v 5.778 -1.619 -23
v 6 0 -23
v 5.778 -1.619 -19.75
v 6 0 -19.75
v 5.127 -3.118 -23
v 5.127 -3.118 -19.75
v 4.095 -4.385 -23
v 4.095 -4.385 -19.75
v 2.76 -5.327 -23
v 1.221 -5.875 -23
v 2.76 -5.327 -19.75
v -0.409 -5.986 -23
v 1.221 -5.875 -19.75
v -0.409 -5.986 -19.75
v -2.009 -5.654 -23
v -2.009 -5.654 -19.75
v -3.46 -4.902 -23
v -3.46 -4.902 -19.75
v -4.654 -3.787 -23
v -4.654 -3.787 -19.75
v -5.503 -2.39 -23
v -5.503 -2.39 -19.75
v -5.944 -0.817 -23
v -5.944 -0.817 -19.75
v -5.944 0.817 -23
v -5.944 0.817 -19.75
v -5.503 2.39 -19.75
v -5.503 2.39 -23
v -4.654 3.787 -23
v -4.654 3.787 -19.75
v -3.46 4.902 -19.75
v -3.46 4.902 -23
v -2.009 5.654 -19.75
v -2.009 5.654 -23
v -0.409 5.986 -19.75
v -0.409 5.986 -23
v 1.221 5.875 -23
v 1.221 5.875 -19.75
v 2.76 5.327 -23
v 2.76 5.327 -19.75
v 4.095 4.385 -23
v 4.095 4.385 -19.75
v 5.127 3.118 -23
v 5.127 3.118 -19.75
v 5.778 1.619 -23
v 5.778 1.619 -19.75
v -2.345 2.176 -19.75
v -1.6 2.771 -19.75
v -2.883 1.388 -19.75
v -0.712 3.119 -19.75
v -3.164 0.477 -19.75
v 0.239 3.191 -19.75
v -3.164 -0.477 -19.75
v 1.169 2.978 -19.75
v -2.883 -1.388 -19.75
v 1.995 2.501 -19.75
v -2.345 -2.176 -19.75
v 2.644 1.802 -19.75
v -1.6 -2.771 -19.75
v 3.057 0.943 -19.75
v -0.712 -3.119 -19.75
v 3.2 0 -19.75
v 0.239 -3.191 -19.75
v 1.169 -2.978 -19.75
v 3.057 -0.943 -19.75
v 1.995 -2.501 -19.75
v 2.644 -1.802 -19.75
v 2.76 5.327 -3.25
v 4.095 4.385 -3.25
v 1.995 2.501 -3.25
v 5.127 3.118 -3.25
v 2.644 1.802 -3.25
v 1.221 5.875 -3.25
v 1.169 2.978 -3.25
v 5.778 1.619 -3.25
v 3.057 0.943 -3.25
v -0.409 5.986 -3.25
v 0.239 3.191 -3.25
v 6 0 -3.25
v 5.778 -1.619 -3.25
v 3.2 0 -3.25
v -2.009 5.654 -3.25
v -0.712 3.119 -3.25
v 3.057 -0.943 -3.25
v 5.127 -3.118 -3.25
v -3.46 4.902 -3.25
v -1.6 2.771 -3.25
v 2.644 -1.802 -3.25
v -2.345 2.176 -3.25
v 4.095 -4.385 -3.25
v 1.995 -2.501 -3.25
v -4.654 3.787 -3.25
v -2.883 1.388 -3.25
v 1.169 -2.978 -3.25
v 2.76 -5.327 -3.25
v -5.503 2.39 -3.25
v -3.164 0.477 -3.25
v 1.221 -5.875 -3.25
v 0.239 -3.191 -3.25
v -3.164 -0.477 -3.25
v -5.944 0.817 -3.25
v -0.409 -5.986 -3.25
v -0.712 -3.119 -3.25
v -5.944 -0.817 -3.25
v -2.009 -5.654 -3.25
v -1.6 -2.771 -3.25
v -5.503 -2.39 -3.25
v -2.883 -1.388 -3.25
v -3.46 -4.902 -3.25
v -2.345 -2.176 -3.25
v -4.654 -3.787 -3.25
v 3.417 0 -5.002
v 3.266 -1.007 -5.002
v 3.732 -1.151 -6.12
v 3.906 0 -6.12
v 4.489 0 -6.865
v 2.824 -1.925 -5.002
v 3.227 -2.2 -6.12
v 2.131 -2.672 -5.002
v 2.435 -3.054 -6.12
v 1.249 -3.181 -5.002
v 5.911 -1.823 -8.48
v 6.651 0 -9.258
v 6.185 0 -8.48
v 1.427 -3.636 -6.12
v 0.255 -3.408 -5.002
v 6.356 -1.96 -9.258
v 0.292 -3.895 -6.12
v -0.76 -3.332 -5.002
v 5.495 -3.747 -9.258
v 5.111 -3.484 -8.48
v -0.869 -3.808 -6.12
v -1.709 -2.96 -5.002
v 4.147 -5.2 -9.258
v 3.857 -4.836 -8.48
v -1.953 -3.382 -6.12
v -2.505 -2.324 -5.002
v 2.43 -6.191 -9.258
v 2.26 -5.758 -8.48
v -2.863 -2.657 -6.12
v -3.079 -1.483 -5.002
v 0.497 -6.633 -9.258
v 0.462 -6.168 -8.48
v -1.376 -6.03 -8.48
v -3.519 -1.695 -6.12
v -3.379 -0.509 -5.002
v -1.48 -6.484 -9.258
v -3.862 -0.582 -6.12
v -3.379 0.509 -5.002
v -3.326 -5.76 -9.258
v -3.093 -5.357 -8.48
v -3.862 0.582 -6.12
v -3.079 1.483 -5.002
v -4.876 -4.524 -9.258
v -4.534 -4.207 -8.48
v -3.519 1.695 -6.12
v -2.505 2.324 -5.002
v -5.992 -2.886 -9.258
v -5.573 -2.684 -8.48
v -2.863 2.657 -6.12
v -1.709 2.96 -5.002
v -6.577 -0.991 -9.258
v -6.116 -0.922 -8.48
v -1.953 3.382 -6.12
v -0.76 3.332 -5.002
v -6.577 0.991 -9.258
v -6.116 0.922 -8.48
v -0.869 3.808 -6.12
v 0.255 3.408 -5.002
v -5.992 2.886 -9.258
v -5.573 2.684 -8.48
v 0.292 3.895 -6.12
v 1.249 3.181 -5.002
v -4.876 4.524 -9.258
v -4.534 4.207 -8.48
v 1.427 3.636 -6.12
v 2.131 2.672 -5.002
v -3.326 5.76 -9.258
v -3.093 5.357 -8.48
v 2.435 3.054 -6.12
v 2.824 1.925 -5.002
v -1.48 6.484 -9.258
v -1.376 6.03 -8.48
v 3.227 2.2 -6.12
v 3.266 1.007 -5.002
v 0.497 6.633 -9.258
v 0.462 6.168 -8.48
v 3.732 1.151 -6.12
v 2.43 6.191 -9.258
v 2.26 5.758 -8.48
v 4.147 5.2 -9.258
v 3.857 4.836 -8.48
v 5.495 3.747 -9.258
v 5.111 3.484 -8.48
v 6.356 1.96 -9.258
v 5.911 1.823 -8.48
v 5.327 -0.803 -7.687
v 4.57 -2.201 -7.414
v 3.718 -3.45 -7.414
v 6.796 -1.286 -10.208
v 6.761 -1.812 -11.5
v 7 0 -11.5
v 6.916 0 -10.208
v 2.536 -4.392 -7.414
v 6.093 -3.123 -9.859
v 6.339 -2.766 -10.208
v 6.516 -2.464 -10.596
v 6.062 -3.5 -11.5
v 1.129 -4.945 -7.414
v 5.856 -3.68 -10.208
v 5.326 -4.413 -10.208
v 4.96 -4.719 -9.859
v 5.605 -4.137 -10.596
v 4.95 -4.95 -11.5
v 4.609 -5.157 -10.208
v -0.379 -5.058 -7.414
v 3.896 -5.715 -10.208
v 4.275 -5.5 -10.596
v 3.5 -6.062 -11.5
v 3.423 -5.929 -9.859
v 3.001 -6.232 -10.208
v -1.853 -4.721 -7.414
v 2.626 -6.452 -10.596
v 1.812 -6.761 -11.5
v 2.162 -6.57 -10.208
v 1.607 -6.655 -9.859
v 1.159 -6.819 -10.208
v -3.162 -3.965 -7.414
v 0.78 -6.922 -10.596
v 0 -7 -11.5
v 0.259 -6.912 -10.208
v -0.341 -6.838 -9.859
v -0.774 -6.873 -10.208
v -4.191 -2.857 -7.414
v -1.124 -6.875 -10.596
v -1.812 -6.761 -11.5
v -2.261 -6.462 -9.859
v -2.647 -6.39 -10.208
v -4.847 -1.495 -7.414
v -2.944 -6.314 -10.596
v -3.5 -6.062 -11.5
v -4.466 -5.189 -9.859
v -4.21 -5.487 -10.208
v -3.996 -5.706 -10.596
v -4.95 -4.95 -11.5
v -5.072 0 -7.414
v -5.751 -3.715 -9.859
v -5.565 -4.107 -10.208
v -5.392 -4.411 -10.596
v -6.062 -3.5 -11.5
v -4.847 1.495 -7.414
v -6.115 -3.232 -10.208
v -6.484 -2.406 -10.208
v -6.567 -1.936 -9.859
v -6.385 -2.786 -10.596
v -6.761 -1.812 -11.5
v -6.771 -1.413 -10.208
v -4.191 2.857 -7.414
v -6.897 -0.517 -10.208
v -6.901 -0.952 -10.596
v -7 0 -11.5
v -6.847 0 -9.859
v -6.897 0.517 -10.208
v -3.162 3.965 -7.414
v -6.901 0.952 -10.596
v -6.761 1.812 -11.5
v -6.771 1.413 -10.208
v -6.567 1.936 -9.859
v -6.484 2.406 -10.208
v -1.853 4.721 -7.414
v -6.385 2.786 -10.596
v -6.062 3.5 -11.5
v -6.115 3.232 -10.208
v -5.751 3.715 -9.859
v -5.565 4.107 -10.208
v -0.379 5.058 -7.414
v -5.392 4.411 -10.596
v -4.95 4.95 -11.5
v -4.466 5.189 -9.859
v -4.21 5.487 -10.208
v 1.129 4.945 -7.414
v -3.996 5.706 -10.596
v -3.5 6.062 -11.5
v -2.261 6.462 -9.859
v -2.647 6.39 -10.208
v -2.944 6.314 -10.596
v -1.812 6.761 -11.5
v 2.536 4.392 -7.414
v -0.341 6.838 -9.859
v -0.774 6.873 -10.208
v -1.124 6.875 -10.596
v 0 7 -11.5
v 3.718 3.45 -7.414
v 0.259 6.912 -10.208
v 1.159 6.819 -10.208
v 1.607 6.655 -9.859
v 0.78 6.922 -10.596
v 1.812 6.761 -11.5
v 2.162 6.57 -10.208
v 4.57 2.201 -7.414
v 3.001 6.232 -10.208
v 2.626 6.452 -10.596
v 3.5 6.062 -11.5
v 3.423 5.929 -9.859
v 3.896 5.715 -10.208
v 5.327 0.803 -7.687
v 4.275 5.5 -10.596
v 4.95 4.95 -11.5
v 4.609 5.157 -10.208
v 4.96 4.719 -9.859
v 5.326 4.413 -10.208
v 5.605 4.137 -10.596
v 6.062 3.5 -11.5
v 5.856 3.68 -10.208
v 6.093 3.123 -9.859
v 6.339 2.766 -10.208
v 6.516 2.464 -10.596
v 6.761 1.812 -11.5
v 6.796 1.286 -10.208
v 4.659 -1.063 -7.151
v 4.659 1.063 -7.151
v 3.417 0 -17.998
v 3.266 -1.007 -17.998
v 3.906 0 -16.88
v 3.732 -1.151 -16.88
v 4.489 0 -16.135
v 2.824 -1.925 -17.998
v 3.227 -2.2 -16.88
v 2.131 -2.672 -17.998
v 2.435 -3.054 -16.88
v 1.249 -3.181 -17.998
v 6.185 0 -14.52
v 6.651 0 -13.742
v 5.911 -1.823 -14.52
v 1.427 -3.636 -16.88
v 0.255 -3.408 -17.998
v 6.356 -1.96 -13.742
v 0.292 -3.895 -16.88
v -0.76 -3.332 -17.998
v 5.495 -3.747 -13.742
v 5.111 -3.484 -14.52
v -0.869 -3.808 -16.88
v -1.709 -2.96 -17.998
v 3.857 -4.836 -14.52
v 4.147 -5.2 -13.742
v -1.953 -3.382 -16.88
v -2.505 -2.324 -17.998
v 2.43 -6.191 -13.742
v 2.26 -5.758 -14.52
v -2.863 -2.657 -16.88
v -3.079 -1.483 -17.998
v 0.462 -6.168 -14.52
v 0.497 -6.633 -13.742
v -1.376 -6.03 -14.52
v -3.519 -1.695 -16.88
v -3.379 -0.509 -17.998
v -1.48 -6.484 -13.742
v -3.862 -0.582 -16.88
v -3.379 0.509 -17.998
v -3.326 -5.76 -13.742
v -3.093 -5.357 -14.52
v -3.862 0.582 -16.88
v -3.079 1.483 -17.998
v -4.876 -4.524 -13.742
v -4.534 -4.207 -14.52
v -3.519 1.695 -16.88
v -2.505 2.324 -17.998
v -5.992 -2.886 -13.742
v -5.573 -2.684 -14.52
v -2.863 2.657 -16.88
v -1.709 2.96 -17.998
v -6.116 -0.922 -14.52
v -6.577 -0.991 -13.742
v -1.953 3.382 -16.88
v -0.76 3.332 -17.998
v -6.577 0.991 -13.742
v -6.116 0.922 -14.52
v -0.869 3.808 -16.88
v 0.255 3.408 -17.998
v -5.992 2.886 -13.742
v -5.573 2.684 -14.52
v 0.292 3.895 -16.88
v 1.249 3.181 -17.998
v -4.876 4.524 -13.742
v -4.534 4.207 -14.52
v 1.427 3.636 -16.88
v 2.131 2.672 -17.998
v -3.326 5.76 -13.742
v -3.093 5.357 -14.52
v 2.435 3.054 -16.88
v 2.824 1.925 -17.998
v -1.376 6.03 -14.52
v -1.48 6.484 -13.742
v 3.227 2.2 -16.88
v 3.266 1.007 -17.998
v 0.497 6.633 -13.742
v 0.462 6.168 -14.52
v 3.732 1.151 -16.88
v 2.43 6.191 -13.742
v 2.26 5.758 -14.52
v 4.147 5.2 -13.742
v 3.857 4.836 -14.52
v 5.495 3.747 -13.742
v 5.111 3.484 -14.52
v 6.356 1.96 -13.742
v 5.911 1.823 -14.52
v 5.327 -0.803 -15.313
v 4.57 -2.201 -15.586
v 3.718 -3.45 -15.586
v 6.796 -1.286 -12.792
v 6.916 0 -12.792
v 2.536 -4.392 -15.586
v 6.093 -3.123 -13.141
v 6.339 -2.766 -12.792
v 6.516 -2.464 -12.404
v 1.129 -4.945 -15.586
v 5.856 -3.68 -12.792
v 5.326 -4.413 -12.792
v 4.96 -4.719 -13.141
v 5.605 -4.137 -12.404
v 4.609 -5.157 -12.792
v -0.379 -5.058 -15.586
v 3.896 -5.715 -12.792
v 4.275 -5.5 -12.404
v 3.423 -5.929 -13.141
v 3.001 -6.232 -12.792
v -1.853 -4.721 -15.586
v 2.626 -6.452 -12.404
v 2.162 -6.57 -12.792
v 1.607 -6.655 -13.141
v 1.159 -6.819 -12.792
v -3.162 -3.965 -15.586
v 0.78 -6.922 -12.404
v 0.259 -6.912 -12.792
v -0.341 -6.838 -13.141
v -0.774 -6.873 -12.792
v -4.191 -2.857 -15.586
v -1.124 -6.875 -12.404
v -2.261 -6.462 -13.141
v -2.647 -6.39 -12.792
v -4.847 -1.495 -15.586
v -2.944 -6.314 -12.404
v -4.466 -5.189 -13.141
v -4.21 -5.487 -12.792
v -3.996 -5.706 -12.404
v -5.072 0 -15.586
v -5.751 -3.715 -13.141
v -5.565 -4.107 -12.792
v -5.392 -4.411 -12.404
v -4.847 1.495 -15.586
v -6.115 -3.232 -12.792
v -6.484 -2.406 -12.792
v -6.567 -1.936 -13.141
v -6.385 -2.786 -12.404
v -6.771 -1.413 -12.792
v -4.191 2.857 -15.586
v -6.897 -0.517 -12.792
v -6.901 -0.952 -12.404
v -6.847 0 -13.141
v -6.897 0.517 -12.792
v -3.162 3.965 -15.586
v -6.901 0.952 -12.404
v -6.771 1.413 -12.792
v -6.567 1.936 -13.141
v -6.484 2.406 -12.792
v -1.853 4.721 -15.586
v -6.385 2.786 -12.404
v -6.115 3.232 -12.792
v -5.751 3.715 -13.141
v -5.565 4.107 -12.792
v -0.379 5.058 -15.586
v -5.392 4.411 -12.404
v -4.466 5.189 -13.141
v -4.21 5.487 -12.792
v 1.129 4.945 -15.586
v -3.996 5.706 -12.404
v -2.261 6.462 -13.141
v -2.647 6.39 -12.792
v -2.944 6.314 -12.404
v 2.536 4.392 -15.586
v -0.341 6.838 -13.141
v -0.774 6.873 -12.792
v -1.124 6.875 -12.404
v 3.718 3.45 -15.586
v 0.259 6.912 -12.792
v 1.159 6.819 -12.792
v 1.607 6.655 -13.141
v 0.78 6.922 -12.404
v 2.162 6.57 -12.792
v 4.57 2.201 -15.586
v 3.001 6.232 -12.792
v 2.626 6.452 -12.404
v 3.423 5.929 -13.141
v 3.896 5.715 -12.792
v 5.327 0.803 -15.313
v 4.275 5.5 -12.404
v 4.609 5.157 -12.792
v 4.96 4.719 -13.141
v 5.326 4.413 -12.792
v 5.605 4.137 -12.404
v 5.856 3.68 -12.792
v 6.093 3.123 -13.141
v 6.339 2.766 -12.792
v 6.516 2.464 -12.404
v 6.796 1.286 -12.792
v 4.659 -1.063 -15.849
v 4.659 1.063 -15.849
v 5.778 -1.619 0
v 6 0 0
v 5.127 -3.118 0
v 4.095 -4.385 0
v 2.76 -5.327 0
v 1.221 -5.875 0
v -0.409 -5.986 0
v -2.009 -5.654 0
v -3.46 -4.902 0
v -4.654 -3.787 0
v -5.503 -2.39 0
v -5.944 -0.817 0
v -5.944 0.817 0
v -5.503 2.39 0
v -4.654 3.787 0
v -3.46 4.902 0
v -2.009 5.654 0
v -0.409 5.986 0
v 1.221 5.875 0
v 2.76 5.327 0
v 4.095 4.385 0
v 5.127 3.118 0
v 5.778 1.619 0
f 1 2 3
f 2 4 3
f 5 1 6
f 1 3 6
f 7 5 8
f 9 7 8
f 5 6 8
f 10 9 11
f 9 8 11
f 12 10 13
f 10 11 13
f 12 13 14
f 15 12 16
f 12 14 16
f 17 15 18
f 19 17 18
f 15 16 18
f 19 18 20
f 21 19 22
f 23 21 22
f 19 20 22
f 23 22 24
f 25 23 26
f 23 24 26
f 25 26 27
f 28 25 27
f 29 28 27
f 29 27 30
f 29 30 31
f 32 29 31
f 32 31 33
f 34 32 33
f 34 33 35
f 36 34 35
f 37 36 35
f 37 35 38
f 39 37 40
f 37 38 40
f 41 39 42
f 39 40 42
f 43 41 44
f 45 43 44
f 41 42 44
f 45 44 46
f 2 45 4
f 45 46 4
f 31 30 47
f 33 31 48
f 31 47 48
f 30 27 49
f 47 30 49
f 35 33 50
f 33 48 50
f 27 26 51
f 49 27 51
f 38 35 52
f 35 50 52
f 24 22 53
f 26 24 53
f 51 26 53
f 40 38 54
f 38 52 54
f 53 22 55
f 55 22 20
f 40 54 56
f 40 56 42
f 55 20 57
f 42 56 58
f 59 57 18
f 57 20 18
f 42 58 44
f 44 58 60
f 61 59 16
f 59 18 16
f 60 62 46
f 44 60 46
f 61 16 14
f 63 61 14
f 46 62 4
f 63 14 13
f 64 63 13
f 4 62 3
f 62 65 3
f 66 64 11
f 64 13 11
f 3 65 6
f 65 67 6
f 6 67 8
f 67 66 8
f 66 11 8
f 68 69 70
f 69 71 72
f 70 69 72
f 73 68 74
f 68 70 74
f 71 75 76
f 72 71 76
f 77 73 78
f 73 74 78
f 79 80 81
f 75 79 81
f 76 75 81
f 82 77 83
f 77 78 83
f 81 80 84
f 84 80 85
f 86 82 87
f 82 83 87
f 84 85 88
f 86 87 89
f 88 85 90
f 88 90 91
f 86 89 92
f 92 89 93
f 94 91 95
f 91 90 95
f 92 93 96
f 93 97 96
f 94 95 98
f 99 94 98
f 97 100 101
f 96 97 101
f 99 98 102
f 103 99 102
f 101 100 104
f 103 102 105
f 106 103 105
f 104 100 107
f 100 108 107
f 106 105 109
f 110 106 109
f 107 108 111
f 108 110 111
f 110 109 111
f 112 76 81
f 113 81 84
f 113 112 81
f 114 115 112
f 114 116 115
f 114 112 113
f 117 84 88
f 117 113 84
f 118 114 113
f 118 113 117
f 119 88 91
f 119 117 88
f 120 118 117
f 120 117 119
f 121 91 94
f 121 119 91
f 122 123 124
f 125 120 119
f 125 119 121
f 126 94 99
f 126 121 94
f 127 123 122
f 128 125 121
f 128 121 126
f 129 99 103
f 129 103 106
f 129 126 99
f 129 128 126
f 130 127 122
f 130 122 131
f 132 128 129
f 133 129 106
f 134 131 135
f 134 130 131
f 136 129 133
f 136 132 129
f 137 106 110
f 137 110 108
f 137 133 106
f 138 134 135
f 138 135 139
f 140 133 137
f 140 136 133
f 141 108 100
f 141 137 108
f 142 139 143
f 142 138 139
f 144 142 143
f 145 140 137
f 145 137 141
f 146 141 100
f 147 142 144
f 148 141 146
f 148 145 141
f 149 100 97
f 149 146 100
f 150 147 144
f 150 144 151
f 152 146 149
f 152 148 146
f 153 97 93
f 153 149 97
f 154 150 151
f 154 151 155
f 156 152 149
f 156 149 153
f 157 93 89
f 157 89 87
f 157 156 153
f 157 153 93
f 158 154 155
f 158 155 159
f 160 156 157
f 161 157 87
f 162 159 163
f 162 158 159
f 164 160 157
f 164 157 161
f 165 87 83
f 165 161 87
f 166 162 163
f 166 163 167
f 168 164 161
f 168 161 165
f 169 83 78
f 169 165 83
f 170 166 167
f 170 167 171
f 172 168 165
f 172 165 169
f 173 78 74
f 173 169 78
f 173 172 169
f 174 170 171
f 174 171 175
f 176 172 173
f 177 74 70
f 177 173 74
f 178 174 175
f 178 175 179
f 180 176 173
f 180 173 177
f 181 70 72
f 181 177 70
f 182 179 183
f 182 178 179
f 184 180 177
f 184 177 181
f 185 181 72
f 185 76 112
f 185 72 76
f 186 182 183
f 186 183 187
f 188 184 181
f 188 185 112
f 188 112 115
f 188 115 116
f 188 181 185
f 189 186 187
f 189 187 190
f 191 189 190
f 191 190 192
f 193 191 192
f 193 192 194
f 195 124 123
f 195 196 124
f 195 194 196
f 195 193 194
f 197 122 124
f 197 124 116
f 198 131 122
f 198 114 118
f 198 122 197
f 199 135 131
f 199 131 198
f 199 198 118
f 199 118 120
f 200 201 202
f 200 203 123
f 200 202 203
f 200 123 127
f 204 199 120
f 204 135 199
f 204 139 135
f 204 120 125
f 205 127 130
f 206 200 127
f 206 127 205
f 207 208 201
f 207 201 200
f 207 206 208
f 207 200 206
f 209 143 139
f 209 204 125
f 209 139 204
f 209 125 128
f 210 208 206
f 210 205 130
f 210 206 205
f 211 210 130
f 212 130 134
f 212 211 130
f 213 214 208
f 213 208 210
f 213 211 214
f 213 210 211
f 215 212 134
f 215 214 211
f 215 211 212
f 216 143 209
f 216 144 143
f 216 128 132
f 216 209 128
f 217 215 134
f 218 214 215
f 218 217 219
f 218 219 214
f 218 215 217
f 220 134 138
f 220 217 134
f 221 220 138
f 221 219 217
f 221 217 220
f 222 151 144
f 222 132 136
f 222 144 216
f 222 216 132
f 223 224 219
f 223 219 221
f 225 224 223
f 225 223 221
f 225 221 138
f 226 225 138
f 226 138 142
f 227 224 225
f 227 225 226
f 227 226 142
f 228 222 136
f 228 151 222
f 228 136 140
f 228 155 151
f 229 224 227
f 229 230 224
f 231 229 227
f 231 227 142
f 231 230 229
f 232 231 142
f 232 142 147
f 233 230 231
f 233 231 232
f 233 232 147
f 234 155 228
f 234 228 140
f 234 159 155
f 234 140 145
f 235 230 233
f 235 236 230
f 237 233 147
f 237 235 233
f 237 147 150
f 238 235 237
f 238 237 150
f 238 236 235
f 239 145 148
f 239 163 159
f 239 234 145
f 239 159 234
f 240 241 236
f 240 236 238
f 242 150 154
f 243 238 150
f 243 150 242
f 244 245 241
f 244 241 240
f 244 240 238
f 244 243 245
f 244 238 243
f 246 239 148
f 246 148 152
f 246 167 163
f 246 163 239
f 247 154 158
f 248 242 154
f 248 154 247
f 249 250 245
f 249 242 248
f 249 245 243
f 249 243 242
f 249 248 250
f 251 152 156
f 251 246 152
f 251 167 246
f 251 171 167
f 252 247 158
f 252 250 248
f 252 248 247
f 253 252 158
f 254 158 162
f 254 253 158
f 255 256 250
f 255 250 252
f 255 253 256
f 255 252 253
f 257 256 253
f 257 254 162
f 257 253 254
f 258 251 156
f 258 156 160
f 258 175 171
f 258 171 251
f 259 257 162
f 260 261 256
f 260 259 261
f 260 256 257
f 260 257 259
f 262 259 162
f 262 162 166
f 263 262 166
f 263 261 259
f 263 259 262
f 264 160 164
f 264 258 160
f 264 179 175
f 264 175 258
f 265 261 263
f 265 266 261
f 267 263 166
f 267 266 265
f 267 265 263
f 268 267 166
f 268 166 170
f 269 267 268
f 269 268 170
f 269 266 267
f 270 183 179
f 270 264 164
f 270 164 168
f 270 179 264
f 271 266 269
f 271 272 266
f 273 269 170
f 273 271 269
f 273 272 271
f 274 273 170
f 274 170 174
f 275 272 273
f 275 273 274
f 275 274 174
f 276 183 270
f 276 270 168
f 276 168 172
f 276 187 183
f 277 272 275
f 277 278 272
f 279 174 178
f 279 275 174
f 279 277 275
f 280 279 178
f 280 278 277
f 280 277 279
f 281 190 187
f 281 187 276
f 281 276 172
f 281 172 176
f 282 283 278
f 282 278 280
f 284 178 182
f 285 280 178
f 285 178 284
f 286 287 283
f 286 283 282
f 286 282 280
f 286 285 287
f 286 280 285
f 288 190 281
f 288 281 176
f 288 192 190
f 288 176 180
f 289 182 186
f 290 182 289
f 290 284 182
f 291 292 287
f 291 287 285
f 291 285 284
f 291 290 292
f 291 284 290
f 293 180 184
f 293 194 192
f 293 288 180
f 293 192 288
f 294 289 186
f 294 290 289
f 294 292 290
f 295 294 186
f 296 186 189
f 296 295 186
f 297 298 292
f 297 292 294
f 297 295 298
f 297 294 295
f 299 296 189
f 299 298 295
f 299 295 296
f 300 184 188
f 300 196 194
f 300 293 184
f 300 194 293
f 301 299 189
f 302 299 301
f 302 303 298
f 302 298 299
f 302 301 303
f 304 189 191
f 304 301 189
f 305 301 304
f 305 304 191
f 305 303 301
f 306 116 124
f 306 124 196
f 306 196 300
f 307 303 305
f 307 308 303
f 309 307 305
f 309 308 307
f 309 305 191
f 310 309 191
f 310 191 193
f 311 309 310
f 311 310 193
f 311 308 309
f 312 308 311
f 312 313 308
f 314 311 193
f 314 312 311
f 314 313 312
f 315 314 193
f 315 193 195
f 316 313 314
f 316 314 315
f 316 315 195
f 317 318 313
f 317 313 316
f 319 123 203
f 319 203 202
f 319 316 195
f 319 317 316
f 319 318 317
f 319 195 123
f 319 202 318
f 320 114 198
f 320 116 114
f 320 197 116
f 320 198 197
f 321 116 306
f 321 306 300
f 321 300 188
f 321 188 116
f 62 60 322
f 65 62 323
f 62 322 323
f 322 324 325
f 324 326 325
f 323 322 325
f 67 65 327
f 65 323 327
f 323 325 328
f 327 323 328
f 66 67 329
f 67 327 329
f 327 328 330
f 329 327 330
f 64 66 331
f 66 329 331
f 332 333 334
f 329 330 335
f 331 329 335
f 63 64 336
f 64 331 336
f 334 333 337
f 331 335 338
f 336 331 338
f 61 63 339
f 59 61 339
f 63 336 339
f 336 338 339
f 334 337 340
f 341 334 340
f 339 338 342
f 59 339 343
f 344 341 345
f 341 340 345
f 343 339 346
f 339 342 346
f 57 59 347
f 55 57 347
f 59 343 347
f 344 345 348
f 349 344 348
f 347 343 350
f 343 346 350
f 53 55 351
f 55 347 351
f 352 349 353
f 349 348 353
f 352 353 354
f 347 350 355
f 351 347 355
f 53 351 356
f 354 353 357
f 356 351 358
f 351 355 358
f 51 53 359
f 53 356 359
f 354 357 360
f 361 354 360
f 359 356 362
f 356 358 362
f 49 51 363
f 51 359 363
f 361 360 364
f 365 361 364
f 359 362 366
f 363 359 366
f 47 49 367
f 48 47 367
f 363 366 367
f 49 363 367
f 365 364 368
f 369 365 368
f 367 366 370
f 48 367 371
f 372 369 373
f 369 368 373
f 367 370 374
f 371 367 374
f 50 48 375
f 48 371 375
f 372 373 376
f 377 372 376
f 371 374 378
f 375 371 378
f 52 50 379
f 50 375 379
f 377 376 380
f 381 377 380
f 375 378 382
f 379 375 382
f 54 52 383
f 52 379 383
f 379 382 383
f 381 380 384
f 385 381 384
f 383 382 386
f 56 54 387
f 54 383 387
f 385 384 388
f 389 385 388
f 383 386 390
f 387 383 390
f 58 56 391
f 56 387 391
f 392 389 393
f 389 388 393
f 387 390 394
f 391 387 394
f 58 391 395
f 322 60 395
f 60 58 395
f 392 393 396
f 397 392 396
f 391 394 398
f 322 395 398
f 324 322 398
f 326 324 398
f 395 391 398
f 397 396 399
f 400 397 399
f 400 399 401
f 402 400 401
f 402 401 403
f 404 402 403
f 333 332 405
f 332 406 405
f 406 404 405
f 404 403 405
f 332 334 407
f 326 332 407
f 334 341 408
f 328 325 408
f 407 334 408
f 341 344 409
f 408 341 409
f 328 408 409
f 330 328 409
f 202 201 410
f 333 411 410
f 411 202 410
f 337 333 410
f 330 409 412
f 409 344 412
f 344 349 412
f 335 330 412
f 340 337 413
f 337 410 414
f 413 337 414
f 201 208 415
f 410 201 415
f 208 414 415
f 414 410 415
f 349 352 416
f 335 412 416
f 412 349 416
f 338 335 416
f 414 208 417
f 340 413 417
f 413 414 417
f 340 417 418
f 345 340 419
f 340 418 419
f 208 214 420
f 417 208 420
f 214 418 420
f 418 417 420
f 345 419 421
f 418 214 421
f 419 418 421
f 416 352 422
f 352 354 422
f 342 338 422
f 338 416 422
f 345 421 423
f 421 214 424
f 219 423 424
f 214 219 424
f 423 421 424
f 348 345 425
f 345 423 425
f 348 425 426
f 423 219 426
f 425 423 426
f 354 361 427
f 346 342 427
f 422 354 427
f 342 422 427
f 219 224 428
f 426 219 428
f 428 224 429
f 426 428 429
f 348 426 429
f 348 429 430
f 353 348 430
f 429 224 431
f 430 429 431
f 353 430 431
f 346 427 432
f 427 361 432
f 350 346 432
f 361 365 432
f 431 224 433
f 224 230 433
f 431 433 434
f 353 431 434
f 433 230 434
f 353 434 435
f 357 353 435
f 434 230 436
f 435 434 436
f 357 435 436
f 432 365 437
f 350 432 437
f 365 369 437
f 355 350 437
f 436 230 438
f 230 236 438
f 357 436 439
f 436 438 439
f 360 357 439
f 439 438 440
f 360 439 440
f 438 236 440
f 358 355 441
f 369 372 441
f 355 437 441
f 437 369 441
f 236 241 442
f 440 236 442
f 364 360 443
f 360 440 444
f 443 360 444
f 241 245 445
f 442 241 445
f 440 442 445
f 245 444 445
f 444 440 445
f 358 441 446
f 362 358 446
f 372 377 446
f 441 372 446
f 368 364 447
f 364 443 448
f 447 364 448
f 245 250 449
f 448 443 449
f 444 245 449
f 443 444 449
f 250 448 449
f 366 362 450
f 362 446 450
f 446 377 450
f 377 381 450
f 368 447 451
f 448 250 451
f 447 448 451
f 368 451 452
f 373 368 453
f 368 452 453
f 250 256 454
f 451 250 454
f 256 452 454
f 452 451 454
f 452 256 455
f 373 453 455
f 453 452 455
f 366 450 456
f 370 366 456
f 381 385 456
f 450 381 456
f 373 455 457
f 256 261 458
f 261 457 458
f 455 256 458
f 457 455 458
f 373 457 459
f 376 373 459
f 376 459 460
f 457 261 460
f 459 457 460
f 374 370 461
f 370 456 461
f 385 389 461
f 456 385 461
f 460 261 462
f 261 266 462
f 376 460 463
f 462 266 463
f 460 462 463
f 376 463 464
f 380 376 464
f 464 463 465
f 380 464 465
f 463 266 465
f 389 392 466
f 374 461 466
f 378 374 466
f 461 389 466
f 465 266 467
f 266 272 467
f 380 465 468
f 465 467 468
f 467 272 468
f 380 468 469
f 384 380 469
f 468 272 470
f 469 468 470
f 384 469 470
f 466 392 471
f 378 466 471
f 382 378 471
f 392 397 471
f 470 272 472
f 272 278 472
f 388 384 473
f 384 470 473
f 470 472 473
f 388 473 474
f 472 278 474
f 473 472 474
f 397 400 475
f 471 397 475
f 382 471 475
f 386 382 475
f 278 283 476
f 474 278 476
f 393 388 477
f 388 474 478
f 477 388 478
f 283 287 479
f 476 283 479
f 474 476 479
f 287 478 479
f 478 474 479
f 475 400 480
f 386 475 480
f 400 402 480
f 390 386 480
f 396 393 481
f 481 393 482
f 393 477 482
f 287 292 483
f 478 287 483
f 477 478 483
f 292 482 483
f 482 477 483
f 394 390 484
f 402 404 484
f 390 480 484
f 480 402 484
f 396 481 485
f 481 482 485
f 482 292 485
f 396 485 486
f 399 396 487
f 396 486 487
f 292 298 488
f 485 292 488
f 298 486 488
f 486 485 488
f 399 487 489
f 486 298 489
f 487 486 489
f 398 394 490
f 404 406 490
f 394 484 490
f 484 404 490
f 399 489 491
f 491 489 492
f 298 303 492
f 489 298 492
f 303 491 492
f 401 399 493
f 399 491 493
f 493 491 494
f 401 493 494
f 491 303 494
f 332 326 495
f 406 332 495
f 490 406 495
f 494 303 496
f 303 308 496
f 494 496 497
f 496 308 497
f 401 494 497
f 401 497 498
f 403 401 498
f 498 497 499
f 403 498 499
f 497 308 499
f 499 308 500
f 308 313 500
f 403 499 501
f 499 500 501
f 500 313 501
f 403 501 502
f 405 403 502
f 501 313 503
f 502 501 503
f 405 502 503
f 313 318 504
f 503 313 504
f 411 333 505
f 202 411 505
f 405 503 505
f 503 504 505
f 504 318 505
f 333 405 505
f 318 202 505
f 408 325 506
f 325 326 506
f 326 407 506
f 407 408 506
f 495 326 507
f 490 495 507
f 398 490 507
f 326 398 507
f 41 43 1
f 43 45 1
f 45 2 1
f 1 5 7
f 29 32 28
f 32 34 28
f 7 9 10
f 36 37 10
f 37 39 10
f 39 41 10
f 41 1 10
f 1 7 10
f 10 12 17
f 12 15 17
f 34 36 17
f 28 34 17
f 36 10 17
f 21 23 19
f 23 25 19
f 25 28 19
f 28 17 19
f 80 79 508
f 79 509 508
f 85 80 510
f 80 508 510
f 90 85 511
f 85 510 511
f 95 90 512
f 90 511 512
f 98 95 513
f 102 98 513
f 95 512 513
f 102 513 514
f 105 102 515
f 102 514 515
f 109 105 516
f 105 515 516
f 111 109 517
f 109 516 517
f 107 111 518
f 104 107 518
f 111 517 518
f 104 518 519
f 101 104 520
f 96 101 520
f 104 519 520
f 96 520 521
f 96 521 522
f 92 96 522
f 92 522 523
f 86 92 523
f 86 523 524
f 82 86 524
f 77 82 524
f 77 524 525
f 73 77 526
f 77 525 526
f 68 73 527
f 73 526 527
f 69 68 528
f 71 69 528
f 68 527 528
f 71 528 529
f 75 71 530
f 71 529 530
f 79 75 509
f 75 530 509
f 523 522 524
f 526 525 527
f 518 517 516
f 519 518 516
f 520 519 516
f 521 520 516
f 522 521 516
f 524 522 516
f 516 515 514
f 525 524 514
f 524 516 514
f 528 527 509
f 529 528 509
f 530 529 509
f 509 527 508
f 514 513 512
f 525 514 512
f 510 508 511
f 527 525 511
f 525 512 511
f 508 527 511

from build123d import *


with BuildPart() as f1:
    # F0 (on Front) → F1 (revolve)
    with BuildSketch(Plane.XZ):
        with BuildLine():
            Line((6, 0), (0, 0))
            Line((0, 0), (0, -23))
            Line((0, -23), (6, -23))
            Line((6, -23), (6, -19.75))
            Line((6, -19.75), (3.1995258944, -19.75))
            add(Edge.make_bspline(
                [(3.1995258944, -19.75), (3.1995258944, -17.0210715578), (5.588722155, -15.3215501769), (7.0276521617, -13.7139101128), (7, -11.5)],
                knots=[0, 0, 0, 0, 0.5265687159, 1, 1, 1, 1], degree=3))
            add(Edge.make_bspline(
                [(3.1995258944, -3.25), (3.1995258944, -5.9789284422), (5.588722155, -7.6784498231), (7.0276521617, -9.2860898872), (7, -11.5)],
                knots=[0, 0, 0, 0, 0.5265687159, 1, 1, 1, 1], degree=3))
            Line((3.1995258944, -3.25), (6, -3.25))
            Line((6, -3.25), (6, 0))
        make_face()
    revolve(axis=Axis((0, 0, -10.4959332384), (0, 0, -1)))


solid = f1.part
